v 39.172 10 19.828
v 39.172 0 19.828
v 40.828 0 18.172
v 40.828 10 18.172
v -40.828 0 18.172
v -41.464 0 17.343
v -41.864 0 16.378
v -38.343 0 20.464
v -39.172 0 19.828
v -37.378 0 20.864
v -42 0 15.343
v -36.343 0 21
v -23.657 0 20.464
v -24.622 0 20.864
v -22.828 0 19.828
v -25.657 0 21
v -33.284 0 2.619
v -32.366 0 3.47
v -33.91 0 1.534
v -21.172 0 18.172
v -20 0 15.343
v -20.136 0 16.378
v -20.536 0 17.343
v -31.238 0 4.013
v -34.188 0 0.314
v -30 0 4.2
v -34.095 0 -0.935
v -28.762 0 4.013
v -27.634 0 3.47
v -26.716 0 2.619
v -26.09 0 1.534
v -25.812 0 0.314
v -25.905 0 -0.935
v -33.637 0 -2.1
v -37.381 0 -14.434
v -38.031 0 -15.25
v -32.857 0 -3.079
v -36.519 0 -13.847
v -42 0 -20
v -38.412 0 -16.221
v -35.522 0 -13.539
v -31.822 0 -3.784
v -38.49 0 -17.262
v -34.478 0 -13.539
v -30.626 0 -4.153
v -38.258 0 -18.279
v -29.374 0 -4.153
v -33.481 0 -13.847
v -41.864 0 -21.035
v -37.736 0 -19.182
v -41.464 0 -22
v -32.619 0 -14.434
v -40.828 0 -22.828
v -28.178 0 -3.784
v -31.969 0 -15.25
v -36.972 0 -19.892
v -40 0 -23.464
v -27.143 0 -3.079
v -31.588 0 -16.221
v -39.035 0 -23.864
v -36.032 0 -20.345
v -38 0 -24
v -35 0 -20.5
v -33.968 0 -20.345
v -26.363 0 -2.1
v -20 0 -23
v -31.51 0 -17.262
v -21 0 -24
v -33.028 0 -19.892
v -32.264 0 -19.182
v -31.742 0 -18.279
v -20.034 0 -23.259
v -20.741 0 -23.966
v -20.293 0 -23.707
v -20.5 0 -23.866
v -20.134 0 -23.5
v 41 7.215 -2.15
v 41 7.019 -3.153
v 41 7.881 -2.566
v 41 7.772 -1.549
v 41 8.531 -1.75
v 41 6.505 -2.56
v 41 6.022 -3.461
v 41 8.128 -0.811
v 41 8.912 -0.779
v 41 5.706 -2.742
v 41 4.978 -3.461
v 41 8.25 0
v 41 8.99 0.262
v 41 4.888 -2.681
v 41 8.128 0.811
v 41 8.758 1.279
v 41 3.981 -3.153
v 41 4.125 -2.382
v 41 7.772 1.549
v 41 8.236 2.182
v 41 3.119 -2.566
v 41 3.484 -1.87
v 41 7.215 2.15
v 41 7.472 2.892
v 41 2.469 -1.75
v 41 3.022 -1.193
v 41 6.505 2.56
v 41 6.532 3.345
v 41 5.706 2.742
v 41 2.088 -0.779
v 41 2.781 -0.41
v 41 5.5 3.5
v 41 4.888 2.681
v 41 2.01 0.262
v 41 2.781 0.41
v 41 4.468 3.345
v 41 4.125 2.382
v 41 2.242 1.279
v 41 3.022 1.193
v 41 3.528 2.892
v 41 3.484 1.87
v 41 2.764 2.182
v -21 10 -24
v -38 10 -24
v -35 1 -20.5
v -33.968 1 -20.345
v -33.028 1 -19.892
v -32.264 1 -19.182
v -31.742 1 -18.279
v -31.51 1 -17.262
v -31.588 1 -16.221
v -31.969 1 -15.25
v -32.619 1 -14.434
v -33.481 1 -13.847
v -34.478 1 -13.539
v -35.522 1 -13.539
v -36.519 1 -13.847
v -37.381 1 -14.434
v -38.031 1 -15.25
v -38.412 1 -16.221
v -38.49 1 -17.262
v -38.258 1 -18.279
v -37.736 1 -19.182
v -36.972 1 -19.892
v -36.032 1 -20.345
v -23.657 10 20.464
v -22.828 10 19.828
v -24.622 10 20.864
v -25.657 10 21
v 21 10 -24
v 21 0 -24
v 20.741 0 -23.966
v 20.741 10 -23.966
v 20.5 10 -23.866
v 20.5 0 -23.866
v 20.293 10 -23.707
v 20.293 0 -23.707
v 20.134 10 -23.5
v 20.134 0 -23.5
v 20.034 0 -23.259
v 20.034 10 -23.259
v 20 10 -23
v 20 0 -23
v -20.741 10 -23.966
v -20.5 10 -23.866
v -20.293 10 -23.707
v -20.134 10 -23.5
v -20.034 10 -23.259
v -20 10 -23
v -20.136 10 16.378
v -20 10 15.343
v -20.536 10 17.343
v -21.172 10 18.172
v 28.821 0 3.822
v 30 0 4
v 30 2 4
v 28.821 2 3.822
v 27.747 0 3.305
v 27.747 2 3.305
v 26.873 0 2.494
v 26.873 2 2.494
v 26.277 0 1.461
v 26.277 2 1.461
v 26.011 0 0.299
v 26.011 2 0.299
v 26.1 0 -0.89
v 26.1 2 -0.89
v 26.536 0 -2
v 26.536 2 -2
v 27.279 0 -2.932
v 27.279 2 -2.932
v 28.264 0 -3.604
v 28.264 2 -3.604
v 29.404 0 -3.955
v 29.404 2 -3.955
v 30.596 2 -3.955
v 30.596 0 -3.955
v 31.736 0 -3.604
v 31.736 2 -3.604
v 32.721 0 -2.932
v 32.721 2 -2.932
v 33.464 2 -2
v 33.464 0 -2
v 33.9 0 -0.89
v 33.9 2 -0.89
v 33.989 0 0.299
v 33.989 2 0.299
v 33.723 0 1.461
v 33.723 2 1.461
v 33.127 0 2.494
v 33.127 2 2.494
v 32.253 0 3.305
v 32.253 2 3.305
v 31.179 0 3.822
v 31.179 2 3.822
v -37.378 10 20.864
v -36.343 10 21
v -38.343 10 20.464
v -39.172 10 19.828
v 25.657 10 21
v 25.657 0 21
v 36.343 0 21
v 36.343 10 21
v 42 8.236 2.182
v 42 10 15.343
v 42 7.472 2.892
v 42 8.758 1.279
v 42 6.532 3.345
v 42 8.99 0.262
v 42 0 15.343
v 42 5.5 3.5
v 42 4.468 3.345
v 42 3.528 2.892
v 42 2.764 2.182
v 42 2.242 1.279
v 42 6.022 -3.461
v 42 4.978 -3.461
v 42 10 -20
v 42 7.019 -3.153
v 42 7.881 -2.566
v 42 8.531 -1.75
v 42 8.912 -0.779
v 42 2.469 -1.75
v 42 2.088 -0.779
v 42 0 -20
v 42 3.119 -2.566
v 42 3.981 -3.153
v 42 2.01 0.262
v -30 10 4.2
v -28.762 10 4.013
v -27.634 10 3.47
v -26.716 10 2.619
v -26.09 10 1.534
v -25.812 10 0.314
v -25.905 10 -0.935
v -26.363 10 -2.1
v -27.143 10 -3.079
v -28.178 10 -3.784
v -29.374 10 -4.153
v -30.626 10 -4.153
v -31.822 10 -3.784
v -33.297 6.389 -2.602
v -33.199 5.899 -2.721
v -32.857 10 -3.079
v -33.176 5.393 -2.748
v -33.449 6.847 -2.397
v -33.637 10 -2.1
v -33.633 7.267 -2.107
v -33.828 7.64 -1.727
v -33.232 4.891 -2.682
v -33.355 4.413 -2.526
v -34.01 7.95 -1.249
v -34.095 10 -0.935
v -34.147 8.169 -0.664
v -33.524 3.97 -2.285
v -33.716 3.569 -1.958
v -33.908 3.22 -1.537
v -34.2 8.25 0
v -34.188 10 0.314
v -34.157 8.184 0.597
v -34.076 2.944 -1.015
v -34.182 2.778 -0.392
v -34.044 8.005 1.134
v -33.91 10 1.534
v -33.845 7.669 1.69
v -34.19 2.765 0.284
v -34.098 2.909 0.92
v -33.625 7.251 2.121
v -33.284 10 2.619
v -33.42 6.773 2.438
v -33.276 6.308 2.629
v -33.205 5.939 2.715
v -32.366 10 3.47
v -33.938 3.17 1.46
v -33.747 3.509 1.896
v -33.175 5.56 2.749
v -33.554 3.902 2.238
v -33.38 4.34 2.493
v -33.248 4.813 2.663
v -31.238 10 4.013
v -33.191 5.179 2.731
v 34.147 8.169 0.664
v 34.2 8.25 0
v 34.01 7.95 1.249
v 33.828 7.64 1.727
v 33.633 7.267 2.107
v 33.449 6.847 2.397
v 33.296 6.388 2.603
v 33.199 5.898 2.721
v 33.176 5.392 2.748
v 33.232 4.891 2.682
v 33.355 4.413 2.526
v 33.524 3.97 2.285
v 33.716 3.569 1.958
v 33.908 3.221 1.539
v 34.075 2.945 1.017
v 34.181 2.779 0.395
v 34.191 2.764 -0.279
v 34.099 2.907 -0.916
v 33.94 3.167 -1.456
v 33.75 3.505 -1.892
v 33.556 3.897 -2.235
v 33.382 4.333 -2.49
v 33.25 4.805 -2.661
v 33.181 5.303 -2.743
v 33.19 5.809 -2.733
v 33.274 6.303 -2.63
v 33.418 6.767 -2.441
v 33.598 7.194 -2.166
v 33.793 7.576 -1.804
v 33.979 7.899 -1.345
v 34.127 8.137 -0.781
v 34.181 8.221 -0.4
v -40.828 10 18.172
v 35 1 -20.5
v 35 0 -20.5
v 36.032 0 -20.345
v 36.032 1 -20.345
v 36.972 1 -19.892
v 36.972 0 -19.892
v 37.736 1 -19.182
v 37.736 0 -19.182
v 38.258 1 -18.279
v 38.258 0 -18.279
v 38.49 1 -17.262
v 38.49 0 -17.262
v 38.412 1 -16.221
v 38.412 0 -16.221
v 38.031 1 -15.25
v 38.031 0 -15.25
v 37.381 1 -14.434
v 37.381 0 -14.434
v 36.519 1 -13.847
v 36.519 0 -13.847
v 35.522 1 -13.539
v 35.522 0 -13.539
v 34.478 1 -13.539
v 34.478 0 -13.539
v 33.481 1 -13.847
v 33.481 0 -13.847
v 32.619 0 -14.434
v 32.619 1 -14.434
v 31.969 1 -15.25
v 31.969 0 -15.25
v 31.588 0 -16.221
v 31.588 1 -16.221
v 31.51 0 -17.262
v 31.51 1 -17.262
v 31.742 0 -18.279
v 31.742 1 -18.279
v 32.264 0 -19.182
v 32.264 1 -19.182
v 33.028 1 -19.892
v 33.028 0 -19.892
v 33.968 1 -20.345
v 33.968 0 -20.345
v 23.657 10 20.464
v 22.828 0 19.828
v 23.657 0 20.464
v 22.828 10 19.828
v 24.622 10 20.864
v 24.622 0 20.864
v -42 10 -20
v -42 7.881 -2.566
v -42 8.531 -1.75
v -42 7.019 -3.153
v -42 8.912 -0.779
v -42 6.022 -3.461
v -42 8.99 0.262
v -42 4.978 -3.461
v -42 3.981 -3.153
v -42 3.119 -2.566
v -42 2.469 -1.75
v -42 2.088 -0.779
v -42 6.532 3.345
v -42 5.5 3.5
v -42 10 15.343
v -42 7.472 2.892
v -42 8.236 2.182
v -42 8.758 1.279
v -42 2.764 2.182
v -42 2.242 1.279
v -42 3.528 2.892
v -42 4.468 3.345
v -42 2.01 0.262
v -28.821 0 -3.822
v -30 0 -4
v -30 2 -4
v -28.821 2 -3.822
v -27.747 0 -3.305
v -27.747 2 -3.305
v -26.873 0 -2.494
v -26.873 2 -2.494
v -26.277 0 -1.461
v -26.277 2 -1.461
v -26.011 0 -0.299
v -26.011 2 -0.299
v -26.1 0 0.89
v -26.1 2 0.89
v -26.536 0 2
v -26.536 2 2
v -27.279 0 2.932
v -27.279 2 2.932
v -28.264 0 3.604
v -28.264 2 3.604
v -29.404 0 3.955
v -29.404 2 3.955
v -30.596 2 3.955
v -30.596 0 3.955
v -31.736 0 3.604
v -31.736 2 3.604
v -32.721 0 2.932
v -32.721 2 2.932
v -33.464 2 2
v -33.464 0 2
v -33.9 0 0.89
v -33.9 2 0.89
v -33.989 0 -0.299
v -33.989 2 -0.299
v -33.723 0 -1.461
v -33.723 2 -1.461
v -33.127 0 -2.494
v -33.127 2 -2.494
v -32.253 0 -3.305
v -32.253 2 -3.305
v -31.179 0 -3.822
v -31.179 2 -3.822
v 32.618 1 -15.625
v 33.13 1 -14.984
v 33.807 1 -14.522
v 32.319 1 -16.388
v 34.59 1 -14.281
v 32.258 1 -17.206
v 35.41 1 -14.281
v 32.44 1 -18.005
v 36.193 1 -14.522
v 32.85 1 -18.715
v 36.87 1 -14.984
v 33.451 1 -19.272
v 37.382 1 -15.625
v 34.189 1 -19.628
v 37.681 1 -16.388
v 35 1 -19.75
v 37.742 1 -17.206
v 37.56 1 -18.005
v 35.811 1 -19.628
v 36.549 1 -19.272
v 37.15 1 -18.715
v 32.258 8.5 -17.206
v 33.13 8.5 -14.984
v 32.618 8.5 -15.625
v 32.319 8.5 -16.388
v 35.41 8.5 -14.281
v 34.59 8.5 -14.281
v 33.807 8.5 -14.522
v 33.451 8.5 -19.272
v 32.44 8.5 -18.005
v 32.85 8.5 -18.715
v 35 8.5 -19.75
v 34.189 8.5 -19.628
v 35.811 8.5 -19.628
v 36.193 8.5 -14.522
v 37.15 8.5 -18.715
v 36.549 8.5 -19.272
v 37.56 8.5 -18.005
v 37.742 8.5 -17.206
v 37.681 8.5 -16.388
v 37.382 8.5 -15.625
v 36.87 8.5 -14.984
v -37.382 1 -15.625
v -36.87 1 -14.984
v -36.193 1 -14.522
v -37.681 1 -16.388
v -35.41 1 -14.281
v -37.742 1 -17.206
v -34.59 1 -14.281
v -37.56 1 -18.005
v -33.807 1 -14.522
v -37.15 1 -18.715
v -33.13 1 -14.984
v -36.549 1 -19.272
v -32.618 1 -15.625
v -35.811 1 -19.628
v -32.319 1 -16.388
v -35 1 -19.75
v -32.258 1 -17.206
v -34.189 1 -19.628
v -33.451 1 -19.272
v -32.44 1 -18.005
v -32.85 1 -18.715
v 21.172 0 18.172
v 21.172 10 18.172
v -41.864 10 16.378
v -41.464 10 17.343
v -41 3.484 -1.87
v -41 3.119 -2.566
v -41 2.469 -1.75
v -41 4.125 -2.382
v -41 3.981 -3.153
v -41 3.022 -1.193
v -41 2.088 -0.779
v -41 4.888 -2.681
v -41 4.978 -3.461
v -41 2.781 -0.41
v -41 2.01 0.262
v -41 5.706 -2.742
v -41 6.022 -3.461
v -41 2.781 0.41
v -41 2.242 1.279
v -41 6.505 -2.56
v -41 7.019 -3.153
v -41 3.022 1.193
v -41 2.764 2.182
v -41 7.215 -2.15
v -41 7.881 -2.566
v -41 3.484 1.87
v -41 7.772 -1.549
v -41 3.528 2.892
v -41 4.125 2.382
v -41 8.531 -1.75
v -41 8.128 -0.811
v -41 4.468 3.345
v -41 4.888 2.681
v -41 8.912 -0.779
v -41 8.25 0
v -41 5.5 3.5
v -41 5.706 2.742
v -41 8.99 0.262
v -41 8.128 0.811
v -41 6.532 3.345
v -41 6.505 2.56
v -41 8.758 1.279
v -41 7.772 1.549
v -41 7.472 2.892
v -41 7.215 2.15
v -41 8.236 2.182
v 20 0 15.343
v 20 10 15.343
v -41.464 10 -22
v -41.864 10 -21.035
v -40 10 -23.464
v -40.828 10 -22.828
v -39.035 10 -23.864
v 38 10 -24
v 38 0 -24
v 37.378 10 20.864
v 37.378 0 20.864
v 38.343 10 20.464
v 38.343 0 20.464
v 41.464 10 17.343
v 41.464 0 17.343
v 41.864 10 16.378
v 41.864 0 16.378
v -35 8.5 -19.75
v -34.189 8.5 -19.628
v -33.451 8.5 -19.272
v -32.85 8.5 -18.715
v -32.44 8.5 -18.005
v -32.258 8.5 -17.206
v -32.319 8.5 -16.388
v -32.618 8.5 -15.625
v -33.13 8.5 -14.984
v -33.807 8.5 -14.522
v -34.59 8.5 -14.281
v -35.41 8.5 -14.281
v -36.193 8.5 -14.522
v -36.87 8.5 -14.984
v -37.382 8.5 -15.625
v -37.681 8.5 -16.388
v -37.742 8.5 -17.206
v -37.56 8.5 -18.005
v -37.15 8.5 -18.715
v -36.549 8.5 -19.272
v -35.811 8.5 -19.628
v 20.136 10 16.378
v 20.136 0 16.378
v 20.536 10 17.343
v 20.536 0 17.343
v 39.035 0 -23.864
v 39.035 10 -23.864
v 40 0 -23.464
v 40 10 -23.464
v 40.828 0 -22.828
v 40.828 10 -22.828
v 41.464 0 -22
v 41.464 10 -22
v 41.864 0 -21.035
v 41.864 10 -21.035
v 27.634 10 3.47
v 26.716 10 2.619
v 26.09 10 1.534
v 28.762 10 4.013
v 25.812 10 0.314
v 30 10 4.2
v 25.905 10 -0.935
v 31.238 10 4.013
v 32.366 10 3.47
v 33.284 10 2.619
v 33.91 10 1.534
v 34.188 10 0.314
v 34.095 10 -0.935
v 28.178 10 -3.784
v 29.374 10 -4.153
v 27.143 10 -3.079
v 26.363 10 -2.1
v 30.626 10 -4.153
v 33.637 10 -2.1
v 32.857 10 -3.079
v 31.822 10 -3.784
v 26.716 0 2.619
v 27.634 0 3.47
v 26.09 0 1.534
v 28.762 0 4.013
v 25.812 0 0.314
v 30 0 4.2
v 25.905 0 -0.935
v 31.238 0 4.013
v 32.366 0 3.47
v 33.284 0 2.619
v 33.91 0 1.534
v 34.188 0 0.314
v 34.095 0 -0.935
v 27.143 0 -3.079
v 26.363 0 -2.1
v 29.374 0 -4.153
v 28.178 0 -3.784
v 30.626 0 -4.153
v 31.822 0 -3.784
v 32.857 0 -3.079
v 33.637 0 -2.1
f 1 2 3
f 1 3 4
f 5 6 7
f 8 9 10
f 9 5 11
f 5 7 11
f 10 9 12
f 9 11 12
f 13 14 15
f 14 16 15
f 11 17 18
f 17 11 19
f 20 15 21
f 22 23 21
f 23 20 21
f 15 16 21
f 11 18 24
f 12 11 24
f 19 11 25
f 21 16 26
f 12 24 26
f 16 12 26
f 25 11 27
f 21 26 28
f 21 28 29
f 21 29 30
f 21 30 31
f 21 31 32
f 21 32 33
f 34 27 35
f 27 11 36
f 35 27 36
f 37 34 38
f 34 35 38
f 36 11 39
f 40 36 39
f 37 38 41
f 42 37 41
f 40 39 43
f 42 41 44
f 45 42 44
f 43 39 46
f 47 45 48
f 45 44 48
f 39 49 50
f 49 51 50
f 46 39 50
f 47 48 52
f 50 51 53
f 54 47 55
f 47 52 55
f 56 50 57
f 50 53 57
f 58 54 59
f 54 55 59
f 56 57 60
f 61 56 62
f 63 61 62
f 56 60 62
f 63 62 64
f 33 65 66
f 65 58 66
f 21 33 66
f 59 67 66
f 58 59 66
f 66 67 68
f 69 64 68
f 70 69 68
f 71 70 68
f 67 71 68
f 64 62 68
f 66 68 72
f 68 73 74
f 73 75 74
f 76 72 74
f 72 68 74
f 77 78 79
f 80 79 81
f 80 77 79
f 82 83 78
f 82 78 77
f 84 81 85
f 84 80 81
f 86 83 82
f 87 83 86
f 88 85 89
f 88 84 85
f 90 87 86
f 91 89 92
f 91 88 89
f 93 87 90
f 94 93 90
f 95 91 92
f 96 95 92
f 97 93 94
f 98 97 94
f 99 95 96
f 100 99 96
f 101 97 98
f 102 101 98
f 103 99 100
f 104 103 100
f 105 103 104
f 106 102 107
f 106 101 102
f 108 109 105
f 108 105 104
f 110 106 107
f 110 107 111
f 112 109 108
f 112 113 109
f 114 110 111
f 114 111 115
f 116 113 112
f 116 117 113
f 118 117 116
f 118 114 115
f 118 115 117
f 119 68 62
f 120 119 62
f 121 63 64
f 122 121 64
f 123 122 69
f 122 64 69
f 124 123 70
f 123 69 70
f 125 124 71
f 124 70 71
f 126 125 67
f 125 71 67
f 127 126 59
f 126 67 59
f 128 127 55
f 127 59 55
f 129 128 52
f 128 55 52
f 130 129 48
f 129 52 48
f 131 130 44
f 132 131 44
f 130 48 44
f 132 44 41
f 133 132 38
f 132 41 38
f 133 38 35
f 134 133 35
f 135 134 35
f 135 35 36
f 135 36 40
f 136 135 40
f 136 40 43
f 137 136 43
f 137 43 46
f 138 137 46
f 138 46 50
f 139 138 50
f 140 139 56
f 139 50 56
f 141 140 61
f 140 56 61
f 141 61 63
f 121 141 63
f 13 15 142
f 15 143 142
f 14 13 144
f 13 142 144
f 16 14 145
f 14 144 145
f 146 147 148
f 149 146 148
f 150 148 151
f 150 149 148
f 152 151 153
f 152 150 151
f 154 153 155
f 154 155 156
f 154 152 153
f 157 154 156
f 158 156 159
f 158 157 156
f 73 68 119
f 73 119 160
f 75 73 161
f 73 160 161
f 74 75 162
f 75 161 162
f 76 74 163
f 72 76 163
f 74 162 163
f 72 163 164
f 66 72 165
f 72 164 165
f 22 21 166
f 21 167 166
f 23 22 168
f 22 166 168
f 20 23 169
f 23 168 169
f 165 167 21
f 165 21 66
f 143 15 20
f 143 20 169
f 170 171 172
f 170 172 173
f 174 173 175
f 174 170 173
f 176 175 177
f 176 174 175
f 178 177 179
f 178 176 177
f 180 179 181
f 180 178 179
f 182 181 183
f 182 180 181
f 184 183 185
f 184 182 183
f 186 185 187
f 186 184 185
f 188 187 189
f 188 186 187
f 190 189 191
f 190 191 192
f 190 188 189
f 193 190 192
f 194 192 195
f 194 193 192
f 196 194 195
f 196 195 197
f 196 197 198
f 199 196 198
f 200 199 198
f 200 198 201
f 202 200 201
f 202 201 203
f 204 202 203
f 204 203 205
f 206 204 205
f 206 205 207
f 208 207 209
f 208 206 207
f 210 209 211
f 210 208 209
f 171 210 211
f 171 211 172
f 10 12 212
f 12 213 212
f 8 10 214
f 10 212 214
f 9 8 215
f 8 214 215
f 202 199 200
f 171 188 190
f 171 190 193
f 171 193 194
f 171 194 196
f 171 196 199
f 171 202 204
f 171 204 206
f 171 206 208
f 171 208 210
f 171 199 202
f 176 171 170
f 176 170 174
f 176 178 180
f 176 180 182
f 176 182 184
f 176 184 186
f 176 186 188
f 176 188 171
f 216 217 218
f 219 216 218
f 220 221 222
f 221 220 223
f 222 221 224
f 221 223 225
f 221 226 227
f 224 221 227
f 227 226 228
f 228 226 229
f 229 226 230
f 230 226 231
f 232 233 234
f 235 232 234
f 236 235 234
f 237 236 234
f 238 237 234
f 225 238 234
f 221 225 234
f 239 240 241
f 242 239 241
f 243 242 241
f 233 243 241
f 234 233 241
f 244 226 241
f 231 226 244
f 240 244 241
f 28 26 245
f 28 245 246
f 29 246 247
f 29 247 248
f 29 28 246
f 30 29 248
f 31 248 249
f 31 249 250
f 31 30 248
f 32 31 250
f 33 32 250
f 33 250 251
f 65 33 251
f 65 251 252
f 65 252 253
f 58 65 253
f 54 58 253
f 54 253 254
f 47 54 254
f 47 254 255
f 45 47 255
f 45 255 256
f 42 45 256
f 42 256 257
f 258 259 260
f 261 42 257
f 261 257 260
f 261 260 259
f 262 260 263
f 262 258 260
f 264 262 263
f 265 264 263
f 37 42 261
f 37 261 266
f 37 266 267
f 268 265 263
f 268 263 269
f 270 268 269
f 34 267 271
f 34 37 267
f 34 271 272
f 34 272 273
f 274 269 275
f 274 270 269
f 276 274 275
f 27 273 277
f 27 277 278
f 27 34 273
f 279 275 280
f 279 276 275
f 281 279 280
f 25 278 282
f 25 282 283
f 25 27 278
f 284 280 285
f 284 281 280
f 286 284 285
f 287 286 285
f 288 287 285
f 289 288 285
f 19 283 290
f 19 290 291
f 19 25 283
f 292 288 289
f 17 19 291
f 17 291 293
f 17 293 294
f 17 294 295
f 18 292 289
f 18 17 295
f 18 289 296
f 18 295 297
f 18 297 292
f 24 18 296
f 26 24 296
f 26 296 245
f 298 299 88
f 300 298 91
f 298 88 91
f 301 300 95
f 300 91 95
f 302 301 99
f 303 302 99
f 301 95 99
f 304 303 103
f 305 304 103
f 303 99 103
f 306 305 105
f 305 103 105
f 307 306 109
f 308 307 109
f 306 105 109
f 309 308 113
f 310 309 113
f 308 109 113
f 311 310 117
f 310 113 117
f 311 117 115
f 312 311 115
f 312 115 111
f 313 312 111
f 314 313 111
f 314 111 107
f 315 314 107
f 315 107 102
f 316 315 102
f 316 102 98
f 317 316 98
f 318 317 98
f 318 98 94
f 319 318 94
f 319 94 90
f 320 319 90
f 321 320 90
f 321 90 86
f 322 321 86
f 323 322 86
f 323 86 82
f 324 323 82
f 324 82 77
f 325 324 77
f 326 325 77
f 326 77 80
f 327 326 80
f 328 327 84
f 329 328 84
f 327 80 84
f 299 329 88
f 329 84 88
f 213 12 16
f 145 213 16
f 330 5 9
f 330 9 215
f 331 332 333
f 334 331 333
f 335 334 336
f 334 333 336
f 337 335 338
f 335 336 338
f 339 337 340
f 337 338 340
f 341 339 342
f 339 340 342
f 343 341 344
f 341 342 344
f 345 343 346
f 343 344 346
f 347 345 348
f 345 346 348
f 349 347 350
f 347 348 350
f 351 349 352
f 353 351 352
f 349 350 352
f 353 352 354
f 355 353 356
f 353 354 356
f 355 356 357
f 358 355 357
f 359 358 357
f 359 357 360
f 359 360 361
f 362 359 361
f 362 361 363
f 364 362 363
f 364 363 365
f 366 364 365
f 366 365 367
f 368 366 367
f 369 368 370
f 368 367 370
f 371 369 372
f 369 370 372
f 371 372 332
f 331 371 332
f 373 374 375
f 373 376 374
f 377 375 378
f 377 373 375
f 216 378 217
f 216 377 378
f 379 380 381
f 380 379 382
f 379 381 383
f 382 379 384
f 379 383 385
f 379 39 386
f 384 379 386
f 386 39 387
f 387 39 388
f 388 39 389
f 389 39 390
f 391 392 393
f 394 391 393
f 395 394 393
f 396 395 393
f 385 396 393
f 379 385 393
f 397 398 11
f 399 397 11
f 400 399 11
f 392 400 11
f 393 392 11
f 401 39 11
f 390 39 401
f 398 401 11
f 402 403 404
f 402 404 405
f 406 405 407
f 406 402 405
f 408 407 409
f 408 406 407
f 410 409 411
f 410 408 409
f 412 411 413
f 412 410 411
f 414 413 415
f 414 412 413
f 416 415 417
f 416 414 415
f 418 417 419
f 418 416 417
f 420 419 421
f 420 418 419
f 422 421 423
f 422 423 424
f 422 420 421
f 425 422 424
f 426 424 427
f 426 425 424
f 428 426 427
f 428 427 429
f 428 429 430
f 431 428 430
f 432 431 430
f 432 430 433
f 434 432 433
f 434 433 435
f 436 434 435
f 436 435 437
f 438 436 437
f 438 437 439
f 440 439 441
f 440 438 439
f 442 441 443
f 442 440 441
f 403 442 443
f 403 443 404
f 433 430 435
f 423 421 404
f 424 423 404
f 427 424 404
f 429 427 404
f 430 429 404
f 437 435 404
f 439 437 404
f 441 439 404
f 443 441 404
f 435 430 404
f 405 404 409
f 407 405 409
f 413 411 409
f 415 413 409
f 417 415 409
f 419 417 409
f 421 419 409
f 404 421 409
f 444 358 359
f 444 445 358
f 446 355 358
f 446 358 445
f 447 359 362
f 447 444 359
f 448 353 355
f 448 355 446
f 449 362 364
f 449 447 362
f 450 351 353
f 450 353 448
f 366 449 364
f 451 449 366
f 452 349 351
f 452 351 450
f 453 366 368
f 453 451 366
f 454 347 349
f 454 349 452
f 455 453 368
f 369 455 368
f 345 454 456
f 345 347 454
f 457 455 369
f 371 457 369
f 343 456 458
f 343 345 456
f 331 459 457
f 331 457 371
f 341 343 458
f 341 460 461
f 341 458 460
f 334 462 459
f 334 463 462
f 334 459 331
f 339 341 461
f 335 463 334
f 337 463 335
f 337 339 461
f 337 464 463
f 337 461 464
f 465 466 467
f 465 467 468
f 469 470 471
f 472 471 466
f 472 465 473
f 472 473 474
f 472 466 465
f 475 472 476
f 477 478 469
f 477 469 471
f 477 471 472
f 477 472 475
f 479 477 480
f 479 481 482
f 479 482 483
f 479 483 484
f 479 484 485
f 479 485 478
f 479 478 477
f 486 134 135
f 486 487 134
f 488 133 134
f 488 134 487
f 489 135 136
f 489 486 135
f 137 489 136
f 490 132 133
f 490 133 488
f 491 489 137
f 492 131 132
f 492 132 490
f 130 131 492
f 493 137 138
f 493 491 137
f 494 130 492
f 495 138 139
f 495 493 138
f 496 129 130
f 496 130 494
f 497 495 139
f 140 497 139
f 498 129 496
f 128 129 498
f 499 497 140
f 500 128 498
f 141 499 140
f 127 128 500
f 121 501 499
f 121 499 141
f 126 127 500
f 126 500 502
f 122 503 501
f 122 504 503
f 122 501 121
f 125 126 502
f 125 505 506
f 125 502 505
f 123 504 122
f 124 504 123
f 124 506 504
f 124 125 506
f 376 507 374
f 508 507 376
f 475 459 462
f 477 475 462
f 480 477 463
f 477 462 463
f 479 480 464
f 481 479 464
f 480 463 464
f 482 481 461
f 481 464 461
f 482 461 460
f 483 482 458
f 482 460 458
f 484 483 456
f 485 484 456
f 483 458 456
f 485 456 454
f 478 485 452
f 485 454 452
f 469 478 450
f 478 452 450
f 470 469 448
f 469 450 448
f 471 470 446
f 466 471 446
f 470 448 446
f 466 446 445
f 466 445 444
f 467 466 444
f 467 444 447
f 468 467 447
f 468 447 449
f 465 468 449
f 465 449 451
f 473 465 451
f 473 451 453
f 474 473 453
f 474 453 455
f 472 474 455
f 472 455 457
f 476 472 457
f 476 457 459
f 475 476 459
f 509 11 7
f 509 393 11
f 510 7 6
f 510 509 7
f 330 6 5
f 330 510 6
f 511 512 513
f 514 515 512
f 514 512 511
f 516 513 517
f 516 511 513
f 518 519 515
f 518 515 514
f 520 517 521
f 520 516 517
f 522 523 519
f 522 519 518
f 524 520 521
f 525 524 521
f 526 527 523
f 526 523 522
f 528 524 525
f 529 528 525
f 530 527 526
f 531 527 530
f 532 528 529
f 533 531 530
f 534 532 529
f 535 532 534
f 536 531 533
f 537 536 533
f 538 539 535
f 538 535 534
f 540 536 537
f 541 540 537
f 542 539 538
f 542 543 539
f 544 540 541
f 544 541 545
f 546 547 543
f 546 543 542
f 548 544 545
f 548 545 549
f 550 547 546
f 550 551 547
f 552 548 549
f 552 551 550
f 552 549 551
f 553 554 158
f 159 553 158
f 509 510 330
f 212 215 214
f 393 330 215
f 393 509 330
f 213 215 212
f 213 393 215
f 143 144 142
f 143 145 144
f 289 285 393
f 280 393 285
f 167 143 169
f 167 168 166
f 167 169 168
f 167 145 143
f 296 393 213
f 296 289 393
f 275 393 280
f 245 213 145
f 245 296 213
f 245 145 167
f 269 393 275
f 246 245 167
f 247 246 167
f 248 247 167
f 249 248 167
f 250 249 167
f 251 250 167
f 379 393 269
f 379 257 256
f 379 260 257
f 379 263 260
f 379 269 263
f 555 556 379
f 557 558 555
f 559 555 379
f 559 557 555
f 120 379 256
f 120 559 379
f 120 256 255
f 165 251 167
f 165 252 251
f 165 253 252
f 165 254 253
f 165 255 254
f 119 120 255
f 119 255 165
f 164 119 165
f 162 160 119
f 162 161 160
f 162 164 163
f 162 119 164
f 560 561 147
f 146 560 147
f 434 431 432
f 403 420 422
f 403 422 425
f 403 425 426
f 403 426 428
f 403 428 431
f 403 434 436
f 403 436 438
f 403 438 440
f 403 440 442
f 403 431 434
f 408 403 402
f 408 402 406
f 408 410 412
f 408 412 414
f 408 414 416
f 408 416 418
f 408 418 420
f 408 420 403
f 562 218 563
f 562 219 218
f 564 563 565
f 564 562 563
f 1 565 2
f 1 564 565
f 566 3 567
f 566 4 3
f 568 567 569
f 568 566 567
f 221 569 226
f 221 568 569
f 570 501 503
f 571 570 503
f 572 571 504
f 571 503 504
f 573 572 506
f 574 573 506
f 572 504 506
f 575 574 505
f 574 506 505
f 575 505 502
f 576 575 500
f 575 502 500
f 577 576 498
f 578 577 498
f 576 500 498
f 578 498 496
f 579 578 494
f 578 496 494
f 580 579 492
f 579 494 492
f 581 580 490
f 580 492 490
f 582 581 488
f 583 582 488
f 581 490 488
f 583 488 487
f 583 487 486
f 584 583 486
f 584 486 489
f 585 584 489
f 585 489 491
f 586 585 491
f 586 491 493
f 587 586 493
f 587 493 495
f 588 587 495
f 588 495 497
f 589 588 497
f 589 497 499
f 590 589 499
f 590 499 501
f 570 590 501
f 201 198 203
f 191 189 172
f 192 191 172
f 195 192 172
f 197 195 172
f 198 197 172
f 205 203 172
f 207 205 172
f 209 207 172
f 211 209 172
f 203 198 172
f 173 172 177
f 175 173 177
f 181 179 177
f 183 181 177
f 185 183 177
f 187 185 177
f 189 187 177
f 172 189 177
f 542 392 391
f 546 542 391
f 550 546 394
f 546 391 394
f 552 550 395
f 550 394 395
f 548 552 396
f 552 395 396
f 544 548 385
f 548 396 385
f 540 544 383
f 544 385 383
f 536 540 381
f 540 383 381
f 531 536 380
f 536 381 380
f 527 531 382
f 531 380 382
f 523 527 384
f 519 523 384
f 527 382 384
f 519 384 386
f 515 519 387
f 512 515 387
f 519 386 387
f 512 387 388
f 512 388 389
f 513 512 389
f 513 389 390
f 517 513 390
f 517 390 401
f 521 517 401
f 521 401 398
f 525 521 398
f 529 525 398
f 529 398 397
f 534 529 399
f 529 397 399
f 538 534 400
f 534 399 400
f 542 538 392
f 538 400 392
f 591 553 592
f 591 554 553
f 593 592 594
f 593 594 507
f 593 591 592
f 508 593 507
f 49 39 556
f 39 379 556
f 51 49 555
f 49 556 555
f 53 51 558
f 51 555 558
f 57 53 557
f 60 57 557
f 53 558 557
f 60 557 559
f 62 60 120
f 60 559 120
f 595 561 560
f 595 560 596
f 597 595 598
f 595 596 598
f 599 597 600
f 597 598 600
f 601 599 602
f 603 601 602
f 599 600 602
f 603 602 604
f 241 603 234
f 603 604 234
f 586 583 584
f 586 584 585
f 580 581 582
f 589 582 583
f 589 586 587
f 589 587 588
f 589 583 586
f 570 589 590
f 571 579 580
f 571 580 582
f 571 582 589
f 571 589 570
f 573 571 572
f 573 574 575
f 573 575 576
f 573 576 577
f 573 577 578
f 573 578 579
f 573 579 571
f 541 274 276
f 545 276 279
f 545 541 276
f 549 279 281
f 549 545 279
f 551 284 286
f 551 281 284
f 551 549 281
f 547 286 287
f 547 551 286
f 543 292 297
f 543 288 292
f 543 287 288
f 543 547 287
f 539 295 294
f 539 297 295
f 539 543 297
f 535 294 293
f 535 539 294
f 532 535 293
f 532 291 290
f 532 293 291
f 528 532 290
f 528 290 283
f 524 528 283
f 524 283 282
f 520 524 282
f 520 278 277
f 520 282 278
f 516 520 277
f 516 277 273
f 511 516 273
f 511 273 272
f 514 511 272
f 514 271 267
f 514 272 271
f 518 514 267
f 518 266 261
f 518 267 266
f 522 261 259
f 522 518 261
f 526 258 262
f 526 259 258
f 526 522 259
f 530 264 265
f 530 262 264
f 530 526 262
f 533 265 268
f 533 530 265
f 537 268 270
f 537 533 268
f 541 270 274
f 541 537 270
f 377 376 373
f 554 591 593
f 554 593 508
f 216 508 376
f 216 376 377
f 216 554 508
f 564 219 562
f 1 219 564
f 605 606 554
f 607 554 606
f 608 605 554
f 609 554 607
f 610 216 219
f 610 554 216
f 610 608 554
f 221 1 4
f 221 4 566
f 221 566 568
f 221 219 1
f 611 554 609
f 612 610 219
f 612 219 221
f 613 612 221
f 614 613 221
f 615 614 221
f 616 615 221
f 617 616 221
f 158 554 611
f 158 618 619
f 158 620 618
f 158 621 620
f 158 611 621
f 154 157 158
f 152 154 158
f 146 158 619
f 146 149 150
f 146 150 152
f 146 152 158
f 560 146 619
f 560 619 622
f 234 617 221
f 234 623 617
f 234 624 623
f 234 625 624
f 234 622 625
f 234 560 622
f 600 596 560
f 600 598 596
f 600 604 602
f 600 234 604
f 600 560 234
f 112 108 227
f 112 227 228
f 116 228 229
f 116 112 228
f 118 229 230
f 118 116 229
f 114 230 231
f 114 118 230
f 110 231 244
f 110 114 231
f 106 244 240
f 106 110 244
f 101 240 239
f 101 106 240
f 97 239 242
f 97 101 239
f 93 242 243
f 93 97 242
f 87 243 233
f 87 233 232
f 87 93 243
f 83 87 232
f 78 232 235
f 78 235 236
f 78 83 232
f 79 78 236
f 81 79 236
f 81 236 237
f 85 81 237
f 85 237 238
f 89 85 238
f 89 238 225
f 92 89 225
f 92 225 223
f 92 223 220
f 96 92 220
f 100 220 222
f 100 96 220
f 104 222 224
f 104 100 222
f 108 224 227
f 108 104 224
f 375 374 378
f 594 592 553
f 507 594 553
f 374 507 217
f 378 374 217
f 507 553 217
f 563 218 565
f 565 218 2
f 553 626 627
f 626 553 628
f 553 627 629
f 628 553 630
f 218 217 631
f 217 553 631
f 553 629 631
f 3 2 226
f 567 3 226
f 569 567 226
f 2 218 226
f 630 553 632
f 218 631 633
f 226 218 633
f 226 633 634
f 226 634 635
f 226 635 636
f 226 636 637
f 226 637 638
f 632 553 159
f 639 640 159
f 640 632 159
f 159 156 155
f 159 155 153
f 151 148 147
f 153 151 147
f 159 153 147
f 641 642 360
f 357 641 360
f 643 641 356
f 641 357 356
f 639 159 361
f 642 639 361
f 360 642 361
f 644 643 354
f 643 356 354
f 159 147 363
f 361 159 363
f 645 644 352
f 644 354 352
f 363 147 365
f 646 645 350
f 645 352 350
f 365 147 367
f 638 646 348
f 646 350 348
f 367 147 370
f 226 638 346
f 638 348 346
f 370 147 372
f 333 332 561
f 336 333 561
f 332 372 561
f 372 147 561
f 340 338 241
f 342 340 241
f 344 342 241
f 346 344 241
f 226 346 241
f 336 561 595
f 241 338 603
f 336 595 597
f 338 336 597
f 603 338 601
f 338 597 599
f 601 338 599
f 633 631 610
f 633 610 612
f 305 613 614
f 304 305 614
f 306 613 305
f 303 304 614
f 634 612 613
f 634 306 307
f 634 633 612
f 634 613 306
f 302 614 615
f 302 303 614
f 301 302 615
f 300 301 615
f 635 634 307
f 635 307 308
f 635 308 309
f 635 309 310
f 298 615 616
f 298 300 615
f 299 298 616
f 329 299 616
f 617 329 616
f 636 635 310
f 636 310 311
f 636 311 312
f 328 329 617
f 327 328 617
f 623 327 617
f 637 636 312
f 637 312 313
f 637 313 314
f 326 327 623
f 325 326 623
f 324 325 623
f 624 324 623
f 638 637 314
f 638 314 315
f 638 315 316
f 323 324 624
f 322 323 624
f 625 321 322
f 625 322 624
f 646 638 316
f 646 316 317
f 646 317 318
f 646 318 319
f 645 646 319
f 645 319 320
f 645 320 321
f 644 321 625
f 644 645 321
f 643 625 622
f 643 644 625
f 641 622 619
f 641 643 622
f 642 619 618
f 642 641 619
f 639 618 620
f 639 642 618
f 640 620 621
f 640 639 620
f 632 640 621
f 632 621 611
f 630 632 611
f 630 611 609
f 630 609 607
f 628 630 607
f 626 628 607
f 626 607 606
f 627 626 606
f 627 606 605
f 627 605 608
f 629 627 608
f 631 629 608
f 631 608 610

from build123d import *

# Parameters (mm, degrees)
ESQUISSE1_R                 = 4.2
BOSS_EXTRU_1_DEPTH          = 10
CHANFREIN3_SIZE             = 4
CONG_2_R                    = 4
ESQUISSE3_R                 = 4
BOSS_EXTRU_2_DEPTH          = 2
BOSS_EXTRU_2_2_DEPTH        = 2
ENL_V_START                 = -42
ENL_V_MAT_EXTRU_4_OUTLINE_R = 2.75
ENL_V_MAT_EXTRU_4_DEPTH     = 8.825492271
CONG_4_R                    = 4
ESQUISSE7_R                 = 2.75
ENL_V_MAT_EXTRU_5_DEPTH     = 8.5
ESQUISSE7_4_R               = 3.5
ESQUISSE7_4_R_2             = 2.75
ENL_V_MAT_EXTRU_8_DEPTH     = 1
ESQUISSE8_R                 = 3.5
ENL_V_MAT_EXTRU_9_DEPTH     = 1
ENL_V_START_2               = -1
ESQUISSE9_R                 = 3.5
ENL_V_MAT_EXTRU_10_DEPTH    = 1
ESQUISSE10_W                = 40
ESQUISSE10_H                = 50.736146746
ENL_V_MAT_EXTRU_11_DEPTH    = 10
CONG_5_R                    = 1
CONG_6_R                    = 1


# Read off the part's stored shape, not the designer's step: Enlèv. mat.-Extru.4
with BuildPart() as part:
    # Esquisse1 → Boss.-Extru.1 (new body)
    # profile 1 of 4: a face of its own
    with BuildSketch(Plane(origin=(0, 0, 0), x_dir=(1, 0, 0), z_dir=(0, 1, 0))):
        Polygon((-20, 10.5), (-20, 16), (-20, 17.5), (-15, 17.5), (0, 17.5), (0, 24), (-42, 24), (-42, 16), (-42, 0), (-42, -21), (-20, -21), align=None)
        with Locations(Location((-30, 0, 0), (0, 0, 270))):
            Circle(ESQUISSE1_R, mode=Mode.SUBTRACT)
    # profile 2 of 4: a face of its own
    with BuildSketch(Plane(origin=(0, 0, 0), x_dir=(1, 0, 0), z_dir=(0, 1, 0))):
        Polygon((0, 24), (0, 17.5), (15, 17.5), (20, 17.5), (20, 16), (20, 10.5), (20, -21), (42, -21), (42, 0), (42, 16), (42, 24), align=None)
        with Locations(Location((30, 0, 0), (0, 0, 270))):
            Circle(ESQUISSE1_R, mode=Mode.SUBTRACT)
    # profile 3 of 4: a face of its own
    with BuildSketch(Plane(origin=(0, 0, 0), x_dir=(1, 0, 0), z_dir=(0, 1, 0))):
        Polygon((-20, 17.5), (-20, 16), (-20, 10.5), (-15, 17.5), align=None)
    # profile 4 of 4: a face of its own
    with BuildSketch(Plane(origin=(0, 0, 0), x_dir=(1, 0, 0), z_dir=(0, 1, 0))):
        Polygon((20, 17.5), (15, 17.5), (20, 10.5), (20, 16), align=None)
    extrude(amount=BOSS_EXTRU_1_DEPTH)

    # Chanfrein3
    chanfrein3_edges = [part.edges().sort_by_distance(p)[0] for p in [
        (-20, 5, 21),
        (-42, 5, 21),
        (42, 5, 21),
        (20, 5, 21),
    ]]
    chamfer(chanfrein3_edges, length=CHANFREIN3_SIZE)

    # Congé2
    cong_2_edges = [part.edges().sort_by_distance(p)[0] for p in [
        (42, 5, 17),
        (24, 5, 21),
        (38, 5, 21),
        (20, 5, 17),
        (-24, 5, 21),
        (-38, 5, 21),
        (-42, 5, 17),
        (-20, 5, 17),
    ]]
    fillet(cong_2_edges, radius=CONG_2_R)

    # Enlèv. mat.-Extru.4 outline → Enlèv. mat.-Extru.4 (cut)
    with BuildSketch(Plane.YZ.offset(ENL_V_START)):
        with Locations((5.5, 0)):
            Circle(ENL_V_MAT_EXTRU_4_OUTLINE_R)
    enl_v_mat_extru_4 = extrude(amount=ENL_V_MAT_EXTRU_4_DEPTH, mode=Mode.SUBTRACT)

    # Symétrie10: Enlèv. mat.-Extru.4 across plane
    add(enl_v_mat_extru_4.mirror(Plane(origin=(0, 0, 0), x_dir=(0, 0, 1), z_dir=(1, 0, 0))), mode=Mode.SUBTRACT)

    # Congé4
    cong_4_edges = [part.edges().sort_by_distance(p)[0] for p in [
        (-42, 5, -24),
        (42, 5, -24),
        (20, 5, -10.5),
        (15, 5, -17.5),
        (-15, 5, -17.5),
        (-20, 5, -10.5),
    ]]
    fillet(cong_4_edges, radius=CONG_4_R)

    # Esquisse7 → Enlèv. mat.-Extru.5 (cut)
    with BuildSketch(Plane.XZ):
        with Locations(Location((-35, -17, 0), (0, 0, 270))):
            Circle(ESQUISSE7_R)
        with Locations(Location((35, -17, 0), (0, 0, 270))):
            Circle(ESQUISSE7_R)
    extrude(amount=-ENL_V_MAT_EXTRU_5_DEPTH, mode=Mode.SUBTRACT)

    # Esquisse7<4> → Enlèv. mat.-Extru.8 (cut)
    # profile 1 of 2: a face of its own
    with BuildSketch(Plane.XZ):
        with Locations(Location((-35, -17, 0), (0, 0, 270))):
            Circle(ESQUISSE7_4_R)
        with Locations(Location((-35, -17, 0), (0, 0, 270))):
            Circle(ESQUISSE7_4_R_2, mode=Mode.SUBTRACT)
    # profile 2 of 2: a face of its own
    with BuildSketch(Plane.XZ):
        with Locations(Location((35, -17, 0), (0, 0, 270))):
            Circle(ESQUISSE7_4_R)
        with Locations(Location((35, -17, 0), (0, 0, 270))):
            Circle(ESQUISSE7_4_R_2, mode=Mode.SUBTRACT)
    extrude(amount=-ENL_V_MAT_EXTRU_8_DEPTH, mode=Mode.SUBTRACT)

    # Esquisse8 → Enlèv. mat.-Extru.9 (cut)
    with BuildSketch(Plane.ZY.offset(42)):
        with Locations((0, 5.5)):
            Circle(ESQUISSE8_R)
    extrude(amount=-ENL_V_MAT_EXTRU_9_DEPTH, mode=Mode.SUBTRACT)

    # Esquisse9 → Enlèv. mat.-Extru.10 (cut)
    with BuildSketch(Plane(origin=(42, 0, 0), x_dir=(0, 0, -1), z_dir=(1, 0, 0)).offset(ENL_V_START_2)):
        with Locations(Location((0, 5.5, 0), (0, 0, 180))):
            Circle(ESQUISSE9_R)
    extrude(amount=ENL_V_MAT_EXTRU_10_DEPTH, mode=Mode.SUBTRACT)

    # Esquisse10 → Enlèv. mat.-Extru.11 (cut)
    with BuildSketch(Plane(origin=(0, 10, 0), x_dir=(1, 0, 0), z_dir=(0, 1, 0))):
        Rectangle(ESQUISSE10_W, ESQUISSE10_H)
    extrude(amount=-ENL_V_MAT_EXTRU_11_DEPTH, mode=Mode.SUBTRACT)


with BuildPart() as body_2:
    # Esquisse3 → Boss.-Extru.2 (new body)
    with BuildSketch(Plane.XZ):
        with Locations(Location((-30, 0, 0), (0, 0, 270))):
            Circle(ESQUISSE3_R)
    extrude(amount=-BOSS_EXTRU_2_DEPTH)


with BuildPart() as body_3:
    # Esquisse3 → Boss.-Extru.2 2 (new body)
    with BuildSketch(Plane.XZ):
        with Locations(Location((30, 0, 0), (0, 0, 90))):
            Circle(ESQUISSE3_R)
    extrude(amount=-BOSS_EXTRU_2_2_DEPTH)


with BuildPart() as enl_v_mat_extru_11_piece_1:
    # of the separate pieces the step leaves, piece 1, a body of its own (enl_v_mat_extru_11_pieces)
    add(part.part.solids().sort_by_distance((-42, 0, -20))[0])

    # Congé5
    cong_5_edges = [enl_v_mat_extru_11_piece_1.edges().sort_by_distance(p)[0] for p in [
        (-20, 5, -24),
    ]]
    fillet(cong_5_edges, radius=CONG_5_R)


with BuildPart() as enl_v_mat_extru_11_piece_2:
    # of the separate pieces the step leaves, piece 2, a body of its own (enl_v_mat_extru_11_pieces)
    add(part.part.solids().sort_by_distance((20, 0, -24))[0])

    # Congé6
    cong_6_edges = [enl_v_mat_extru_11_piece_2.edges().sort_by_distance(p)[0] for p in [
        (20, 5, -24),
    ]]
    fillet(cong_6_edges, radius=CONG_6_R)


solid = Compound([body_2.part, body_3.part, enl_v_mat_extru_11_piece_1.part, enl_v_mat_extru_11_piece_2.part])
